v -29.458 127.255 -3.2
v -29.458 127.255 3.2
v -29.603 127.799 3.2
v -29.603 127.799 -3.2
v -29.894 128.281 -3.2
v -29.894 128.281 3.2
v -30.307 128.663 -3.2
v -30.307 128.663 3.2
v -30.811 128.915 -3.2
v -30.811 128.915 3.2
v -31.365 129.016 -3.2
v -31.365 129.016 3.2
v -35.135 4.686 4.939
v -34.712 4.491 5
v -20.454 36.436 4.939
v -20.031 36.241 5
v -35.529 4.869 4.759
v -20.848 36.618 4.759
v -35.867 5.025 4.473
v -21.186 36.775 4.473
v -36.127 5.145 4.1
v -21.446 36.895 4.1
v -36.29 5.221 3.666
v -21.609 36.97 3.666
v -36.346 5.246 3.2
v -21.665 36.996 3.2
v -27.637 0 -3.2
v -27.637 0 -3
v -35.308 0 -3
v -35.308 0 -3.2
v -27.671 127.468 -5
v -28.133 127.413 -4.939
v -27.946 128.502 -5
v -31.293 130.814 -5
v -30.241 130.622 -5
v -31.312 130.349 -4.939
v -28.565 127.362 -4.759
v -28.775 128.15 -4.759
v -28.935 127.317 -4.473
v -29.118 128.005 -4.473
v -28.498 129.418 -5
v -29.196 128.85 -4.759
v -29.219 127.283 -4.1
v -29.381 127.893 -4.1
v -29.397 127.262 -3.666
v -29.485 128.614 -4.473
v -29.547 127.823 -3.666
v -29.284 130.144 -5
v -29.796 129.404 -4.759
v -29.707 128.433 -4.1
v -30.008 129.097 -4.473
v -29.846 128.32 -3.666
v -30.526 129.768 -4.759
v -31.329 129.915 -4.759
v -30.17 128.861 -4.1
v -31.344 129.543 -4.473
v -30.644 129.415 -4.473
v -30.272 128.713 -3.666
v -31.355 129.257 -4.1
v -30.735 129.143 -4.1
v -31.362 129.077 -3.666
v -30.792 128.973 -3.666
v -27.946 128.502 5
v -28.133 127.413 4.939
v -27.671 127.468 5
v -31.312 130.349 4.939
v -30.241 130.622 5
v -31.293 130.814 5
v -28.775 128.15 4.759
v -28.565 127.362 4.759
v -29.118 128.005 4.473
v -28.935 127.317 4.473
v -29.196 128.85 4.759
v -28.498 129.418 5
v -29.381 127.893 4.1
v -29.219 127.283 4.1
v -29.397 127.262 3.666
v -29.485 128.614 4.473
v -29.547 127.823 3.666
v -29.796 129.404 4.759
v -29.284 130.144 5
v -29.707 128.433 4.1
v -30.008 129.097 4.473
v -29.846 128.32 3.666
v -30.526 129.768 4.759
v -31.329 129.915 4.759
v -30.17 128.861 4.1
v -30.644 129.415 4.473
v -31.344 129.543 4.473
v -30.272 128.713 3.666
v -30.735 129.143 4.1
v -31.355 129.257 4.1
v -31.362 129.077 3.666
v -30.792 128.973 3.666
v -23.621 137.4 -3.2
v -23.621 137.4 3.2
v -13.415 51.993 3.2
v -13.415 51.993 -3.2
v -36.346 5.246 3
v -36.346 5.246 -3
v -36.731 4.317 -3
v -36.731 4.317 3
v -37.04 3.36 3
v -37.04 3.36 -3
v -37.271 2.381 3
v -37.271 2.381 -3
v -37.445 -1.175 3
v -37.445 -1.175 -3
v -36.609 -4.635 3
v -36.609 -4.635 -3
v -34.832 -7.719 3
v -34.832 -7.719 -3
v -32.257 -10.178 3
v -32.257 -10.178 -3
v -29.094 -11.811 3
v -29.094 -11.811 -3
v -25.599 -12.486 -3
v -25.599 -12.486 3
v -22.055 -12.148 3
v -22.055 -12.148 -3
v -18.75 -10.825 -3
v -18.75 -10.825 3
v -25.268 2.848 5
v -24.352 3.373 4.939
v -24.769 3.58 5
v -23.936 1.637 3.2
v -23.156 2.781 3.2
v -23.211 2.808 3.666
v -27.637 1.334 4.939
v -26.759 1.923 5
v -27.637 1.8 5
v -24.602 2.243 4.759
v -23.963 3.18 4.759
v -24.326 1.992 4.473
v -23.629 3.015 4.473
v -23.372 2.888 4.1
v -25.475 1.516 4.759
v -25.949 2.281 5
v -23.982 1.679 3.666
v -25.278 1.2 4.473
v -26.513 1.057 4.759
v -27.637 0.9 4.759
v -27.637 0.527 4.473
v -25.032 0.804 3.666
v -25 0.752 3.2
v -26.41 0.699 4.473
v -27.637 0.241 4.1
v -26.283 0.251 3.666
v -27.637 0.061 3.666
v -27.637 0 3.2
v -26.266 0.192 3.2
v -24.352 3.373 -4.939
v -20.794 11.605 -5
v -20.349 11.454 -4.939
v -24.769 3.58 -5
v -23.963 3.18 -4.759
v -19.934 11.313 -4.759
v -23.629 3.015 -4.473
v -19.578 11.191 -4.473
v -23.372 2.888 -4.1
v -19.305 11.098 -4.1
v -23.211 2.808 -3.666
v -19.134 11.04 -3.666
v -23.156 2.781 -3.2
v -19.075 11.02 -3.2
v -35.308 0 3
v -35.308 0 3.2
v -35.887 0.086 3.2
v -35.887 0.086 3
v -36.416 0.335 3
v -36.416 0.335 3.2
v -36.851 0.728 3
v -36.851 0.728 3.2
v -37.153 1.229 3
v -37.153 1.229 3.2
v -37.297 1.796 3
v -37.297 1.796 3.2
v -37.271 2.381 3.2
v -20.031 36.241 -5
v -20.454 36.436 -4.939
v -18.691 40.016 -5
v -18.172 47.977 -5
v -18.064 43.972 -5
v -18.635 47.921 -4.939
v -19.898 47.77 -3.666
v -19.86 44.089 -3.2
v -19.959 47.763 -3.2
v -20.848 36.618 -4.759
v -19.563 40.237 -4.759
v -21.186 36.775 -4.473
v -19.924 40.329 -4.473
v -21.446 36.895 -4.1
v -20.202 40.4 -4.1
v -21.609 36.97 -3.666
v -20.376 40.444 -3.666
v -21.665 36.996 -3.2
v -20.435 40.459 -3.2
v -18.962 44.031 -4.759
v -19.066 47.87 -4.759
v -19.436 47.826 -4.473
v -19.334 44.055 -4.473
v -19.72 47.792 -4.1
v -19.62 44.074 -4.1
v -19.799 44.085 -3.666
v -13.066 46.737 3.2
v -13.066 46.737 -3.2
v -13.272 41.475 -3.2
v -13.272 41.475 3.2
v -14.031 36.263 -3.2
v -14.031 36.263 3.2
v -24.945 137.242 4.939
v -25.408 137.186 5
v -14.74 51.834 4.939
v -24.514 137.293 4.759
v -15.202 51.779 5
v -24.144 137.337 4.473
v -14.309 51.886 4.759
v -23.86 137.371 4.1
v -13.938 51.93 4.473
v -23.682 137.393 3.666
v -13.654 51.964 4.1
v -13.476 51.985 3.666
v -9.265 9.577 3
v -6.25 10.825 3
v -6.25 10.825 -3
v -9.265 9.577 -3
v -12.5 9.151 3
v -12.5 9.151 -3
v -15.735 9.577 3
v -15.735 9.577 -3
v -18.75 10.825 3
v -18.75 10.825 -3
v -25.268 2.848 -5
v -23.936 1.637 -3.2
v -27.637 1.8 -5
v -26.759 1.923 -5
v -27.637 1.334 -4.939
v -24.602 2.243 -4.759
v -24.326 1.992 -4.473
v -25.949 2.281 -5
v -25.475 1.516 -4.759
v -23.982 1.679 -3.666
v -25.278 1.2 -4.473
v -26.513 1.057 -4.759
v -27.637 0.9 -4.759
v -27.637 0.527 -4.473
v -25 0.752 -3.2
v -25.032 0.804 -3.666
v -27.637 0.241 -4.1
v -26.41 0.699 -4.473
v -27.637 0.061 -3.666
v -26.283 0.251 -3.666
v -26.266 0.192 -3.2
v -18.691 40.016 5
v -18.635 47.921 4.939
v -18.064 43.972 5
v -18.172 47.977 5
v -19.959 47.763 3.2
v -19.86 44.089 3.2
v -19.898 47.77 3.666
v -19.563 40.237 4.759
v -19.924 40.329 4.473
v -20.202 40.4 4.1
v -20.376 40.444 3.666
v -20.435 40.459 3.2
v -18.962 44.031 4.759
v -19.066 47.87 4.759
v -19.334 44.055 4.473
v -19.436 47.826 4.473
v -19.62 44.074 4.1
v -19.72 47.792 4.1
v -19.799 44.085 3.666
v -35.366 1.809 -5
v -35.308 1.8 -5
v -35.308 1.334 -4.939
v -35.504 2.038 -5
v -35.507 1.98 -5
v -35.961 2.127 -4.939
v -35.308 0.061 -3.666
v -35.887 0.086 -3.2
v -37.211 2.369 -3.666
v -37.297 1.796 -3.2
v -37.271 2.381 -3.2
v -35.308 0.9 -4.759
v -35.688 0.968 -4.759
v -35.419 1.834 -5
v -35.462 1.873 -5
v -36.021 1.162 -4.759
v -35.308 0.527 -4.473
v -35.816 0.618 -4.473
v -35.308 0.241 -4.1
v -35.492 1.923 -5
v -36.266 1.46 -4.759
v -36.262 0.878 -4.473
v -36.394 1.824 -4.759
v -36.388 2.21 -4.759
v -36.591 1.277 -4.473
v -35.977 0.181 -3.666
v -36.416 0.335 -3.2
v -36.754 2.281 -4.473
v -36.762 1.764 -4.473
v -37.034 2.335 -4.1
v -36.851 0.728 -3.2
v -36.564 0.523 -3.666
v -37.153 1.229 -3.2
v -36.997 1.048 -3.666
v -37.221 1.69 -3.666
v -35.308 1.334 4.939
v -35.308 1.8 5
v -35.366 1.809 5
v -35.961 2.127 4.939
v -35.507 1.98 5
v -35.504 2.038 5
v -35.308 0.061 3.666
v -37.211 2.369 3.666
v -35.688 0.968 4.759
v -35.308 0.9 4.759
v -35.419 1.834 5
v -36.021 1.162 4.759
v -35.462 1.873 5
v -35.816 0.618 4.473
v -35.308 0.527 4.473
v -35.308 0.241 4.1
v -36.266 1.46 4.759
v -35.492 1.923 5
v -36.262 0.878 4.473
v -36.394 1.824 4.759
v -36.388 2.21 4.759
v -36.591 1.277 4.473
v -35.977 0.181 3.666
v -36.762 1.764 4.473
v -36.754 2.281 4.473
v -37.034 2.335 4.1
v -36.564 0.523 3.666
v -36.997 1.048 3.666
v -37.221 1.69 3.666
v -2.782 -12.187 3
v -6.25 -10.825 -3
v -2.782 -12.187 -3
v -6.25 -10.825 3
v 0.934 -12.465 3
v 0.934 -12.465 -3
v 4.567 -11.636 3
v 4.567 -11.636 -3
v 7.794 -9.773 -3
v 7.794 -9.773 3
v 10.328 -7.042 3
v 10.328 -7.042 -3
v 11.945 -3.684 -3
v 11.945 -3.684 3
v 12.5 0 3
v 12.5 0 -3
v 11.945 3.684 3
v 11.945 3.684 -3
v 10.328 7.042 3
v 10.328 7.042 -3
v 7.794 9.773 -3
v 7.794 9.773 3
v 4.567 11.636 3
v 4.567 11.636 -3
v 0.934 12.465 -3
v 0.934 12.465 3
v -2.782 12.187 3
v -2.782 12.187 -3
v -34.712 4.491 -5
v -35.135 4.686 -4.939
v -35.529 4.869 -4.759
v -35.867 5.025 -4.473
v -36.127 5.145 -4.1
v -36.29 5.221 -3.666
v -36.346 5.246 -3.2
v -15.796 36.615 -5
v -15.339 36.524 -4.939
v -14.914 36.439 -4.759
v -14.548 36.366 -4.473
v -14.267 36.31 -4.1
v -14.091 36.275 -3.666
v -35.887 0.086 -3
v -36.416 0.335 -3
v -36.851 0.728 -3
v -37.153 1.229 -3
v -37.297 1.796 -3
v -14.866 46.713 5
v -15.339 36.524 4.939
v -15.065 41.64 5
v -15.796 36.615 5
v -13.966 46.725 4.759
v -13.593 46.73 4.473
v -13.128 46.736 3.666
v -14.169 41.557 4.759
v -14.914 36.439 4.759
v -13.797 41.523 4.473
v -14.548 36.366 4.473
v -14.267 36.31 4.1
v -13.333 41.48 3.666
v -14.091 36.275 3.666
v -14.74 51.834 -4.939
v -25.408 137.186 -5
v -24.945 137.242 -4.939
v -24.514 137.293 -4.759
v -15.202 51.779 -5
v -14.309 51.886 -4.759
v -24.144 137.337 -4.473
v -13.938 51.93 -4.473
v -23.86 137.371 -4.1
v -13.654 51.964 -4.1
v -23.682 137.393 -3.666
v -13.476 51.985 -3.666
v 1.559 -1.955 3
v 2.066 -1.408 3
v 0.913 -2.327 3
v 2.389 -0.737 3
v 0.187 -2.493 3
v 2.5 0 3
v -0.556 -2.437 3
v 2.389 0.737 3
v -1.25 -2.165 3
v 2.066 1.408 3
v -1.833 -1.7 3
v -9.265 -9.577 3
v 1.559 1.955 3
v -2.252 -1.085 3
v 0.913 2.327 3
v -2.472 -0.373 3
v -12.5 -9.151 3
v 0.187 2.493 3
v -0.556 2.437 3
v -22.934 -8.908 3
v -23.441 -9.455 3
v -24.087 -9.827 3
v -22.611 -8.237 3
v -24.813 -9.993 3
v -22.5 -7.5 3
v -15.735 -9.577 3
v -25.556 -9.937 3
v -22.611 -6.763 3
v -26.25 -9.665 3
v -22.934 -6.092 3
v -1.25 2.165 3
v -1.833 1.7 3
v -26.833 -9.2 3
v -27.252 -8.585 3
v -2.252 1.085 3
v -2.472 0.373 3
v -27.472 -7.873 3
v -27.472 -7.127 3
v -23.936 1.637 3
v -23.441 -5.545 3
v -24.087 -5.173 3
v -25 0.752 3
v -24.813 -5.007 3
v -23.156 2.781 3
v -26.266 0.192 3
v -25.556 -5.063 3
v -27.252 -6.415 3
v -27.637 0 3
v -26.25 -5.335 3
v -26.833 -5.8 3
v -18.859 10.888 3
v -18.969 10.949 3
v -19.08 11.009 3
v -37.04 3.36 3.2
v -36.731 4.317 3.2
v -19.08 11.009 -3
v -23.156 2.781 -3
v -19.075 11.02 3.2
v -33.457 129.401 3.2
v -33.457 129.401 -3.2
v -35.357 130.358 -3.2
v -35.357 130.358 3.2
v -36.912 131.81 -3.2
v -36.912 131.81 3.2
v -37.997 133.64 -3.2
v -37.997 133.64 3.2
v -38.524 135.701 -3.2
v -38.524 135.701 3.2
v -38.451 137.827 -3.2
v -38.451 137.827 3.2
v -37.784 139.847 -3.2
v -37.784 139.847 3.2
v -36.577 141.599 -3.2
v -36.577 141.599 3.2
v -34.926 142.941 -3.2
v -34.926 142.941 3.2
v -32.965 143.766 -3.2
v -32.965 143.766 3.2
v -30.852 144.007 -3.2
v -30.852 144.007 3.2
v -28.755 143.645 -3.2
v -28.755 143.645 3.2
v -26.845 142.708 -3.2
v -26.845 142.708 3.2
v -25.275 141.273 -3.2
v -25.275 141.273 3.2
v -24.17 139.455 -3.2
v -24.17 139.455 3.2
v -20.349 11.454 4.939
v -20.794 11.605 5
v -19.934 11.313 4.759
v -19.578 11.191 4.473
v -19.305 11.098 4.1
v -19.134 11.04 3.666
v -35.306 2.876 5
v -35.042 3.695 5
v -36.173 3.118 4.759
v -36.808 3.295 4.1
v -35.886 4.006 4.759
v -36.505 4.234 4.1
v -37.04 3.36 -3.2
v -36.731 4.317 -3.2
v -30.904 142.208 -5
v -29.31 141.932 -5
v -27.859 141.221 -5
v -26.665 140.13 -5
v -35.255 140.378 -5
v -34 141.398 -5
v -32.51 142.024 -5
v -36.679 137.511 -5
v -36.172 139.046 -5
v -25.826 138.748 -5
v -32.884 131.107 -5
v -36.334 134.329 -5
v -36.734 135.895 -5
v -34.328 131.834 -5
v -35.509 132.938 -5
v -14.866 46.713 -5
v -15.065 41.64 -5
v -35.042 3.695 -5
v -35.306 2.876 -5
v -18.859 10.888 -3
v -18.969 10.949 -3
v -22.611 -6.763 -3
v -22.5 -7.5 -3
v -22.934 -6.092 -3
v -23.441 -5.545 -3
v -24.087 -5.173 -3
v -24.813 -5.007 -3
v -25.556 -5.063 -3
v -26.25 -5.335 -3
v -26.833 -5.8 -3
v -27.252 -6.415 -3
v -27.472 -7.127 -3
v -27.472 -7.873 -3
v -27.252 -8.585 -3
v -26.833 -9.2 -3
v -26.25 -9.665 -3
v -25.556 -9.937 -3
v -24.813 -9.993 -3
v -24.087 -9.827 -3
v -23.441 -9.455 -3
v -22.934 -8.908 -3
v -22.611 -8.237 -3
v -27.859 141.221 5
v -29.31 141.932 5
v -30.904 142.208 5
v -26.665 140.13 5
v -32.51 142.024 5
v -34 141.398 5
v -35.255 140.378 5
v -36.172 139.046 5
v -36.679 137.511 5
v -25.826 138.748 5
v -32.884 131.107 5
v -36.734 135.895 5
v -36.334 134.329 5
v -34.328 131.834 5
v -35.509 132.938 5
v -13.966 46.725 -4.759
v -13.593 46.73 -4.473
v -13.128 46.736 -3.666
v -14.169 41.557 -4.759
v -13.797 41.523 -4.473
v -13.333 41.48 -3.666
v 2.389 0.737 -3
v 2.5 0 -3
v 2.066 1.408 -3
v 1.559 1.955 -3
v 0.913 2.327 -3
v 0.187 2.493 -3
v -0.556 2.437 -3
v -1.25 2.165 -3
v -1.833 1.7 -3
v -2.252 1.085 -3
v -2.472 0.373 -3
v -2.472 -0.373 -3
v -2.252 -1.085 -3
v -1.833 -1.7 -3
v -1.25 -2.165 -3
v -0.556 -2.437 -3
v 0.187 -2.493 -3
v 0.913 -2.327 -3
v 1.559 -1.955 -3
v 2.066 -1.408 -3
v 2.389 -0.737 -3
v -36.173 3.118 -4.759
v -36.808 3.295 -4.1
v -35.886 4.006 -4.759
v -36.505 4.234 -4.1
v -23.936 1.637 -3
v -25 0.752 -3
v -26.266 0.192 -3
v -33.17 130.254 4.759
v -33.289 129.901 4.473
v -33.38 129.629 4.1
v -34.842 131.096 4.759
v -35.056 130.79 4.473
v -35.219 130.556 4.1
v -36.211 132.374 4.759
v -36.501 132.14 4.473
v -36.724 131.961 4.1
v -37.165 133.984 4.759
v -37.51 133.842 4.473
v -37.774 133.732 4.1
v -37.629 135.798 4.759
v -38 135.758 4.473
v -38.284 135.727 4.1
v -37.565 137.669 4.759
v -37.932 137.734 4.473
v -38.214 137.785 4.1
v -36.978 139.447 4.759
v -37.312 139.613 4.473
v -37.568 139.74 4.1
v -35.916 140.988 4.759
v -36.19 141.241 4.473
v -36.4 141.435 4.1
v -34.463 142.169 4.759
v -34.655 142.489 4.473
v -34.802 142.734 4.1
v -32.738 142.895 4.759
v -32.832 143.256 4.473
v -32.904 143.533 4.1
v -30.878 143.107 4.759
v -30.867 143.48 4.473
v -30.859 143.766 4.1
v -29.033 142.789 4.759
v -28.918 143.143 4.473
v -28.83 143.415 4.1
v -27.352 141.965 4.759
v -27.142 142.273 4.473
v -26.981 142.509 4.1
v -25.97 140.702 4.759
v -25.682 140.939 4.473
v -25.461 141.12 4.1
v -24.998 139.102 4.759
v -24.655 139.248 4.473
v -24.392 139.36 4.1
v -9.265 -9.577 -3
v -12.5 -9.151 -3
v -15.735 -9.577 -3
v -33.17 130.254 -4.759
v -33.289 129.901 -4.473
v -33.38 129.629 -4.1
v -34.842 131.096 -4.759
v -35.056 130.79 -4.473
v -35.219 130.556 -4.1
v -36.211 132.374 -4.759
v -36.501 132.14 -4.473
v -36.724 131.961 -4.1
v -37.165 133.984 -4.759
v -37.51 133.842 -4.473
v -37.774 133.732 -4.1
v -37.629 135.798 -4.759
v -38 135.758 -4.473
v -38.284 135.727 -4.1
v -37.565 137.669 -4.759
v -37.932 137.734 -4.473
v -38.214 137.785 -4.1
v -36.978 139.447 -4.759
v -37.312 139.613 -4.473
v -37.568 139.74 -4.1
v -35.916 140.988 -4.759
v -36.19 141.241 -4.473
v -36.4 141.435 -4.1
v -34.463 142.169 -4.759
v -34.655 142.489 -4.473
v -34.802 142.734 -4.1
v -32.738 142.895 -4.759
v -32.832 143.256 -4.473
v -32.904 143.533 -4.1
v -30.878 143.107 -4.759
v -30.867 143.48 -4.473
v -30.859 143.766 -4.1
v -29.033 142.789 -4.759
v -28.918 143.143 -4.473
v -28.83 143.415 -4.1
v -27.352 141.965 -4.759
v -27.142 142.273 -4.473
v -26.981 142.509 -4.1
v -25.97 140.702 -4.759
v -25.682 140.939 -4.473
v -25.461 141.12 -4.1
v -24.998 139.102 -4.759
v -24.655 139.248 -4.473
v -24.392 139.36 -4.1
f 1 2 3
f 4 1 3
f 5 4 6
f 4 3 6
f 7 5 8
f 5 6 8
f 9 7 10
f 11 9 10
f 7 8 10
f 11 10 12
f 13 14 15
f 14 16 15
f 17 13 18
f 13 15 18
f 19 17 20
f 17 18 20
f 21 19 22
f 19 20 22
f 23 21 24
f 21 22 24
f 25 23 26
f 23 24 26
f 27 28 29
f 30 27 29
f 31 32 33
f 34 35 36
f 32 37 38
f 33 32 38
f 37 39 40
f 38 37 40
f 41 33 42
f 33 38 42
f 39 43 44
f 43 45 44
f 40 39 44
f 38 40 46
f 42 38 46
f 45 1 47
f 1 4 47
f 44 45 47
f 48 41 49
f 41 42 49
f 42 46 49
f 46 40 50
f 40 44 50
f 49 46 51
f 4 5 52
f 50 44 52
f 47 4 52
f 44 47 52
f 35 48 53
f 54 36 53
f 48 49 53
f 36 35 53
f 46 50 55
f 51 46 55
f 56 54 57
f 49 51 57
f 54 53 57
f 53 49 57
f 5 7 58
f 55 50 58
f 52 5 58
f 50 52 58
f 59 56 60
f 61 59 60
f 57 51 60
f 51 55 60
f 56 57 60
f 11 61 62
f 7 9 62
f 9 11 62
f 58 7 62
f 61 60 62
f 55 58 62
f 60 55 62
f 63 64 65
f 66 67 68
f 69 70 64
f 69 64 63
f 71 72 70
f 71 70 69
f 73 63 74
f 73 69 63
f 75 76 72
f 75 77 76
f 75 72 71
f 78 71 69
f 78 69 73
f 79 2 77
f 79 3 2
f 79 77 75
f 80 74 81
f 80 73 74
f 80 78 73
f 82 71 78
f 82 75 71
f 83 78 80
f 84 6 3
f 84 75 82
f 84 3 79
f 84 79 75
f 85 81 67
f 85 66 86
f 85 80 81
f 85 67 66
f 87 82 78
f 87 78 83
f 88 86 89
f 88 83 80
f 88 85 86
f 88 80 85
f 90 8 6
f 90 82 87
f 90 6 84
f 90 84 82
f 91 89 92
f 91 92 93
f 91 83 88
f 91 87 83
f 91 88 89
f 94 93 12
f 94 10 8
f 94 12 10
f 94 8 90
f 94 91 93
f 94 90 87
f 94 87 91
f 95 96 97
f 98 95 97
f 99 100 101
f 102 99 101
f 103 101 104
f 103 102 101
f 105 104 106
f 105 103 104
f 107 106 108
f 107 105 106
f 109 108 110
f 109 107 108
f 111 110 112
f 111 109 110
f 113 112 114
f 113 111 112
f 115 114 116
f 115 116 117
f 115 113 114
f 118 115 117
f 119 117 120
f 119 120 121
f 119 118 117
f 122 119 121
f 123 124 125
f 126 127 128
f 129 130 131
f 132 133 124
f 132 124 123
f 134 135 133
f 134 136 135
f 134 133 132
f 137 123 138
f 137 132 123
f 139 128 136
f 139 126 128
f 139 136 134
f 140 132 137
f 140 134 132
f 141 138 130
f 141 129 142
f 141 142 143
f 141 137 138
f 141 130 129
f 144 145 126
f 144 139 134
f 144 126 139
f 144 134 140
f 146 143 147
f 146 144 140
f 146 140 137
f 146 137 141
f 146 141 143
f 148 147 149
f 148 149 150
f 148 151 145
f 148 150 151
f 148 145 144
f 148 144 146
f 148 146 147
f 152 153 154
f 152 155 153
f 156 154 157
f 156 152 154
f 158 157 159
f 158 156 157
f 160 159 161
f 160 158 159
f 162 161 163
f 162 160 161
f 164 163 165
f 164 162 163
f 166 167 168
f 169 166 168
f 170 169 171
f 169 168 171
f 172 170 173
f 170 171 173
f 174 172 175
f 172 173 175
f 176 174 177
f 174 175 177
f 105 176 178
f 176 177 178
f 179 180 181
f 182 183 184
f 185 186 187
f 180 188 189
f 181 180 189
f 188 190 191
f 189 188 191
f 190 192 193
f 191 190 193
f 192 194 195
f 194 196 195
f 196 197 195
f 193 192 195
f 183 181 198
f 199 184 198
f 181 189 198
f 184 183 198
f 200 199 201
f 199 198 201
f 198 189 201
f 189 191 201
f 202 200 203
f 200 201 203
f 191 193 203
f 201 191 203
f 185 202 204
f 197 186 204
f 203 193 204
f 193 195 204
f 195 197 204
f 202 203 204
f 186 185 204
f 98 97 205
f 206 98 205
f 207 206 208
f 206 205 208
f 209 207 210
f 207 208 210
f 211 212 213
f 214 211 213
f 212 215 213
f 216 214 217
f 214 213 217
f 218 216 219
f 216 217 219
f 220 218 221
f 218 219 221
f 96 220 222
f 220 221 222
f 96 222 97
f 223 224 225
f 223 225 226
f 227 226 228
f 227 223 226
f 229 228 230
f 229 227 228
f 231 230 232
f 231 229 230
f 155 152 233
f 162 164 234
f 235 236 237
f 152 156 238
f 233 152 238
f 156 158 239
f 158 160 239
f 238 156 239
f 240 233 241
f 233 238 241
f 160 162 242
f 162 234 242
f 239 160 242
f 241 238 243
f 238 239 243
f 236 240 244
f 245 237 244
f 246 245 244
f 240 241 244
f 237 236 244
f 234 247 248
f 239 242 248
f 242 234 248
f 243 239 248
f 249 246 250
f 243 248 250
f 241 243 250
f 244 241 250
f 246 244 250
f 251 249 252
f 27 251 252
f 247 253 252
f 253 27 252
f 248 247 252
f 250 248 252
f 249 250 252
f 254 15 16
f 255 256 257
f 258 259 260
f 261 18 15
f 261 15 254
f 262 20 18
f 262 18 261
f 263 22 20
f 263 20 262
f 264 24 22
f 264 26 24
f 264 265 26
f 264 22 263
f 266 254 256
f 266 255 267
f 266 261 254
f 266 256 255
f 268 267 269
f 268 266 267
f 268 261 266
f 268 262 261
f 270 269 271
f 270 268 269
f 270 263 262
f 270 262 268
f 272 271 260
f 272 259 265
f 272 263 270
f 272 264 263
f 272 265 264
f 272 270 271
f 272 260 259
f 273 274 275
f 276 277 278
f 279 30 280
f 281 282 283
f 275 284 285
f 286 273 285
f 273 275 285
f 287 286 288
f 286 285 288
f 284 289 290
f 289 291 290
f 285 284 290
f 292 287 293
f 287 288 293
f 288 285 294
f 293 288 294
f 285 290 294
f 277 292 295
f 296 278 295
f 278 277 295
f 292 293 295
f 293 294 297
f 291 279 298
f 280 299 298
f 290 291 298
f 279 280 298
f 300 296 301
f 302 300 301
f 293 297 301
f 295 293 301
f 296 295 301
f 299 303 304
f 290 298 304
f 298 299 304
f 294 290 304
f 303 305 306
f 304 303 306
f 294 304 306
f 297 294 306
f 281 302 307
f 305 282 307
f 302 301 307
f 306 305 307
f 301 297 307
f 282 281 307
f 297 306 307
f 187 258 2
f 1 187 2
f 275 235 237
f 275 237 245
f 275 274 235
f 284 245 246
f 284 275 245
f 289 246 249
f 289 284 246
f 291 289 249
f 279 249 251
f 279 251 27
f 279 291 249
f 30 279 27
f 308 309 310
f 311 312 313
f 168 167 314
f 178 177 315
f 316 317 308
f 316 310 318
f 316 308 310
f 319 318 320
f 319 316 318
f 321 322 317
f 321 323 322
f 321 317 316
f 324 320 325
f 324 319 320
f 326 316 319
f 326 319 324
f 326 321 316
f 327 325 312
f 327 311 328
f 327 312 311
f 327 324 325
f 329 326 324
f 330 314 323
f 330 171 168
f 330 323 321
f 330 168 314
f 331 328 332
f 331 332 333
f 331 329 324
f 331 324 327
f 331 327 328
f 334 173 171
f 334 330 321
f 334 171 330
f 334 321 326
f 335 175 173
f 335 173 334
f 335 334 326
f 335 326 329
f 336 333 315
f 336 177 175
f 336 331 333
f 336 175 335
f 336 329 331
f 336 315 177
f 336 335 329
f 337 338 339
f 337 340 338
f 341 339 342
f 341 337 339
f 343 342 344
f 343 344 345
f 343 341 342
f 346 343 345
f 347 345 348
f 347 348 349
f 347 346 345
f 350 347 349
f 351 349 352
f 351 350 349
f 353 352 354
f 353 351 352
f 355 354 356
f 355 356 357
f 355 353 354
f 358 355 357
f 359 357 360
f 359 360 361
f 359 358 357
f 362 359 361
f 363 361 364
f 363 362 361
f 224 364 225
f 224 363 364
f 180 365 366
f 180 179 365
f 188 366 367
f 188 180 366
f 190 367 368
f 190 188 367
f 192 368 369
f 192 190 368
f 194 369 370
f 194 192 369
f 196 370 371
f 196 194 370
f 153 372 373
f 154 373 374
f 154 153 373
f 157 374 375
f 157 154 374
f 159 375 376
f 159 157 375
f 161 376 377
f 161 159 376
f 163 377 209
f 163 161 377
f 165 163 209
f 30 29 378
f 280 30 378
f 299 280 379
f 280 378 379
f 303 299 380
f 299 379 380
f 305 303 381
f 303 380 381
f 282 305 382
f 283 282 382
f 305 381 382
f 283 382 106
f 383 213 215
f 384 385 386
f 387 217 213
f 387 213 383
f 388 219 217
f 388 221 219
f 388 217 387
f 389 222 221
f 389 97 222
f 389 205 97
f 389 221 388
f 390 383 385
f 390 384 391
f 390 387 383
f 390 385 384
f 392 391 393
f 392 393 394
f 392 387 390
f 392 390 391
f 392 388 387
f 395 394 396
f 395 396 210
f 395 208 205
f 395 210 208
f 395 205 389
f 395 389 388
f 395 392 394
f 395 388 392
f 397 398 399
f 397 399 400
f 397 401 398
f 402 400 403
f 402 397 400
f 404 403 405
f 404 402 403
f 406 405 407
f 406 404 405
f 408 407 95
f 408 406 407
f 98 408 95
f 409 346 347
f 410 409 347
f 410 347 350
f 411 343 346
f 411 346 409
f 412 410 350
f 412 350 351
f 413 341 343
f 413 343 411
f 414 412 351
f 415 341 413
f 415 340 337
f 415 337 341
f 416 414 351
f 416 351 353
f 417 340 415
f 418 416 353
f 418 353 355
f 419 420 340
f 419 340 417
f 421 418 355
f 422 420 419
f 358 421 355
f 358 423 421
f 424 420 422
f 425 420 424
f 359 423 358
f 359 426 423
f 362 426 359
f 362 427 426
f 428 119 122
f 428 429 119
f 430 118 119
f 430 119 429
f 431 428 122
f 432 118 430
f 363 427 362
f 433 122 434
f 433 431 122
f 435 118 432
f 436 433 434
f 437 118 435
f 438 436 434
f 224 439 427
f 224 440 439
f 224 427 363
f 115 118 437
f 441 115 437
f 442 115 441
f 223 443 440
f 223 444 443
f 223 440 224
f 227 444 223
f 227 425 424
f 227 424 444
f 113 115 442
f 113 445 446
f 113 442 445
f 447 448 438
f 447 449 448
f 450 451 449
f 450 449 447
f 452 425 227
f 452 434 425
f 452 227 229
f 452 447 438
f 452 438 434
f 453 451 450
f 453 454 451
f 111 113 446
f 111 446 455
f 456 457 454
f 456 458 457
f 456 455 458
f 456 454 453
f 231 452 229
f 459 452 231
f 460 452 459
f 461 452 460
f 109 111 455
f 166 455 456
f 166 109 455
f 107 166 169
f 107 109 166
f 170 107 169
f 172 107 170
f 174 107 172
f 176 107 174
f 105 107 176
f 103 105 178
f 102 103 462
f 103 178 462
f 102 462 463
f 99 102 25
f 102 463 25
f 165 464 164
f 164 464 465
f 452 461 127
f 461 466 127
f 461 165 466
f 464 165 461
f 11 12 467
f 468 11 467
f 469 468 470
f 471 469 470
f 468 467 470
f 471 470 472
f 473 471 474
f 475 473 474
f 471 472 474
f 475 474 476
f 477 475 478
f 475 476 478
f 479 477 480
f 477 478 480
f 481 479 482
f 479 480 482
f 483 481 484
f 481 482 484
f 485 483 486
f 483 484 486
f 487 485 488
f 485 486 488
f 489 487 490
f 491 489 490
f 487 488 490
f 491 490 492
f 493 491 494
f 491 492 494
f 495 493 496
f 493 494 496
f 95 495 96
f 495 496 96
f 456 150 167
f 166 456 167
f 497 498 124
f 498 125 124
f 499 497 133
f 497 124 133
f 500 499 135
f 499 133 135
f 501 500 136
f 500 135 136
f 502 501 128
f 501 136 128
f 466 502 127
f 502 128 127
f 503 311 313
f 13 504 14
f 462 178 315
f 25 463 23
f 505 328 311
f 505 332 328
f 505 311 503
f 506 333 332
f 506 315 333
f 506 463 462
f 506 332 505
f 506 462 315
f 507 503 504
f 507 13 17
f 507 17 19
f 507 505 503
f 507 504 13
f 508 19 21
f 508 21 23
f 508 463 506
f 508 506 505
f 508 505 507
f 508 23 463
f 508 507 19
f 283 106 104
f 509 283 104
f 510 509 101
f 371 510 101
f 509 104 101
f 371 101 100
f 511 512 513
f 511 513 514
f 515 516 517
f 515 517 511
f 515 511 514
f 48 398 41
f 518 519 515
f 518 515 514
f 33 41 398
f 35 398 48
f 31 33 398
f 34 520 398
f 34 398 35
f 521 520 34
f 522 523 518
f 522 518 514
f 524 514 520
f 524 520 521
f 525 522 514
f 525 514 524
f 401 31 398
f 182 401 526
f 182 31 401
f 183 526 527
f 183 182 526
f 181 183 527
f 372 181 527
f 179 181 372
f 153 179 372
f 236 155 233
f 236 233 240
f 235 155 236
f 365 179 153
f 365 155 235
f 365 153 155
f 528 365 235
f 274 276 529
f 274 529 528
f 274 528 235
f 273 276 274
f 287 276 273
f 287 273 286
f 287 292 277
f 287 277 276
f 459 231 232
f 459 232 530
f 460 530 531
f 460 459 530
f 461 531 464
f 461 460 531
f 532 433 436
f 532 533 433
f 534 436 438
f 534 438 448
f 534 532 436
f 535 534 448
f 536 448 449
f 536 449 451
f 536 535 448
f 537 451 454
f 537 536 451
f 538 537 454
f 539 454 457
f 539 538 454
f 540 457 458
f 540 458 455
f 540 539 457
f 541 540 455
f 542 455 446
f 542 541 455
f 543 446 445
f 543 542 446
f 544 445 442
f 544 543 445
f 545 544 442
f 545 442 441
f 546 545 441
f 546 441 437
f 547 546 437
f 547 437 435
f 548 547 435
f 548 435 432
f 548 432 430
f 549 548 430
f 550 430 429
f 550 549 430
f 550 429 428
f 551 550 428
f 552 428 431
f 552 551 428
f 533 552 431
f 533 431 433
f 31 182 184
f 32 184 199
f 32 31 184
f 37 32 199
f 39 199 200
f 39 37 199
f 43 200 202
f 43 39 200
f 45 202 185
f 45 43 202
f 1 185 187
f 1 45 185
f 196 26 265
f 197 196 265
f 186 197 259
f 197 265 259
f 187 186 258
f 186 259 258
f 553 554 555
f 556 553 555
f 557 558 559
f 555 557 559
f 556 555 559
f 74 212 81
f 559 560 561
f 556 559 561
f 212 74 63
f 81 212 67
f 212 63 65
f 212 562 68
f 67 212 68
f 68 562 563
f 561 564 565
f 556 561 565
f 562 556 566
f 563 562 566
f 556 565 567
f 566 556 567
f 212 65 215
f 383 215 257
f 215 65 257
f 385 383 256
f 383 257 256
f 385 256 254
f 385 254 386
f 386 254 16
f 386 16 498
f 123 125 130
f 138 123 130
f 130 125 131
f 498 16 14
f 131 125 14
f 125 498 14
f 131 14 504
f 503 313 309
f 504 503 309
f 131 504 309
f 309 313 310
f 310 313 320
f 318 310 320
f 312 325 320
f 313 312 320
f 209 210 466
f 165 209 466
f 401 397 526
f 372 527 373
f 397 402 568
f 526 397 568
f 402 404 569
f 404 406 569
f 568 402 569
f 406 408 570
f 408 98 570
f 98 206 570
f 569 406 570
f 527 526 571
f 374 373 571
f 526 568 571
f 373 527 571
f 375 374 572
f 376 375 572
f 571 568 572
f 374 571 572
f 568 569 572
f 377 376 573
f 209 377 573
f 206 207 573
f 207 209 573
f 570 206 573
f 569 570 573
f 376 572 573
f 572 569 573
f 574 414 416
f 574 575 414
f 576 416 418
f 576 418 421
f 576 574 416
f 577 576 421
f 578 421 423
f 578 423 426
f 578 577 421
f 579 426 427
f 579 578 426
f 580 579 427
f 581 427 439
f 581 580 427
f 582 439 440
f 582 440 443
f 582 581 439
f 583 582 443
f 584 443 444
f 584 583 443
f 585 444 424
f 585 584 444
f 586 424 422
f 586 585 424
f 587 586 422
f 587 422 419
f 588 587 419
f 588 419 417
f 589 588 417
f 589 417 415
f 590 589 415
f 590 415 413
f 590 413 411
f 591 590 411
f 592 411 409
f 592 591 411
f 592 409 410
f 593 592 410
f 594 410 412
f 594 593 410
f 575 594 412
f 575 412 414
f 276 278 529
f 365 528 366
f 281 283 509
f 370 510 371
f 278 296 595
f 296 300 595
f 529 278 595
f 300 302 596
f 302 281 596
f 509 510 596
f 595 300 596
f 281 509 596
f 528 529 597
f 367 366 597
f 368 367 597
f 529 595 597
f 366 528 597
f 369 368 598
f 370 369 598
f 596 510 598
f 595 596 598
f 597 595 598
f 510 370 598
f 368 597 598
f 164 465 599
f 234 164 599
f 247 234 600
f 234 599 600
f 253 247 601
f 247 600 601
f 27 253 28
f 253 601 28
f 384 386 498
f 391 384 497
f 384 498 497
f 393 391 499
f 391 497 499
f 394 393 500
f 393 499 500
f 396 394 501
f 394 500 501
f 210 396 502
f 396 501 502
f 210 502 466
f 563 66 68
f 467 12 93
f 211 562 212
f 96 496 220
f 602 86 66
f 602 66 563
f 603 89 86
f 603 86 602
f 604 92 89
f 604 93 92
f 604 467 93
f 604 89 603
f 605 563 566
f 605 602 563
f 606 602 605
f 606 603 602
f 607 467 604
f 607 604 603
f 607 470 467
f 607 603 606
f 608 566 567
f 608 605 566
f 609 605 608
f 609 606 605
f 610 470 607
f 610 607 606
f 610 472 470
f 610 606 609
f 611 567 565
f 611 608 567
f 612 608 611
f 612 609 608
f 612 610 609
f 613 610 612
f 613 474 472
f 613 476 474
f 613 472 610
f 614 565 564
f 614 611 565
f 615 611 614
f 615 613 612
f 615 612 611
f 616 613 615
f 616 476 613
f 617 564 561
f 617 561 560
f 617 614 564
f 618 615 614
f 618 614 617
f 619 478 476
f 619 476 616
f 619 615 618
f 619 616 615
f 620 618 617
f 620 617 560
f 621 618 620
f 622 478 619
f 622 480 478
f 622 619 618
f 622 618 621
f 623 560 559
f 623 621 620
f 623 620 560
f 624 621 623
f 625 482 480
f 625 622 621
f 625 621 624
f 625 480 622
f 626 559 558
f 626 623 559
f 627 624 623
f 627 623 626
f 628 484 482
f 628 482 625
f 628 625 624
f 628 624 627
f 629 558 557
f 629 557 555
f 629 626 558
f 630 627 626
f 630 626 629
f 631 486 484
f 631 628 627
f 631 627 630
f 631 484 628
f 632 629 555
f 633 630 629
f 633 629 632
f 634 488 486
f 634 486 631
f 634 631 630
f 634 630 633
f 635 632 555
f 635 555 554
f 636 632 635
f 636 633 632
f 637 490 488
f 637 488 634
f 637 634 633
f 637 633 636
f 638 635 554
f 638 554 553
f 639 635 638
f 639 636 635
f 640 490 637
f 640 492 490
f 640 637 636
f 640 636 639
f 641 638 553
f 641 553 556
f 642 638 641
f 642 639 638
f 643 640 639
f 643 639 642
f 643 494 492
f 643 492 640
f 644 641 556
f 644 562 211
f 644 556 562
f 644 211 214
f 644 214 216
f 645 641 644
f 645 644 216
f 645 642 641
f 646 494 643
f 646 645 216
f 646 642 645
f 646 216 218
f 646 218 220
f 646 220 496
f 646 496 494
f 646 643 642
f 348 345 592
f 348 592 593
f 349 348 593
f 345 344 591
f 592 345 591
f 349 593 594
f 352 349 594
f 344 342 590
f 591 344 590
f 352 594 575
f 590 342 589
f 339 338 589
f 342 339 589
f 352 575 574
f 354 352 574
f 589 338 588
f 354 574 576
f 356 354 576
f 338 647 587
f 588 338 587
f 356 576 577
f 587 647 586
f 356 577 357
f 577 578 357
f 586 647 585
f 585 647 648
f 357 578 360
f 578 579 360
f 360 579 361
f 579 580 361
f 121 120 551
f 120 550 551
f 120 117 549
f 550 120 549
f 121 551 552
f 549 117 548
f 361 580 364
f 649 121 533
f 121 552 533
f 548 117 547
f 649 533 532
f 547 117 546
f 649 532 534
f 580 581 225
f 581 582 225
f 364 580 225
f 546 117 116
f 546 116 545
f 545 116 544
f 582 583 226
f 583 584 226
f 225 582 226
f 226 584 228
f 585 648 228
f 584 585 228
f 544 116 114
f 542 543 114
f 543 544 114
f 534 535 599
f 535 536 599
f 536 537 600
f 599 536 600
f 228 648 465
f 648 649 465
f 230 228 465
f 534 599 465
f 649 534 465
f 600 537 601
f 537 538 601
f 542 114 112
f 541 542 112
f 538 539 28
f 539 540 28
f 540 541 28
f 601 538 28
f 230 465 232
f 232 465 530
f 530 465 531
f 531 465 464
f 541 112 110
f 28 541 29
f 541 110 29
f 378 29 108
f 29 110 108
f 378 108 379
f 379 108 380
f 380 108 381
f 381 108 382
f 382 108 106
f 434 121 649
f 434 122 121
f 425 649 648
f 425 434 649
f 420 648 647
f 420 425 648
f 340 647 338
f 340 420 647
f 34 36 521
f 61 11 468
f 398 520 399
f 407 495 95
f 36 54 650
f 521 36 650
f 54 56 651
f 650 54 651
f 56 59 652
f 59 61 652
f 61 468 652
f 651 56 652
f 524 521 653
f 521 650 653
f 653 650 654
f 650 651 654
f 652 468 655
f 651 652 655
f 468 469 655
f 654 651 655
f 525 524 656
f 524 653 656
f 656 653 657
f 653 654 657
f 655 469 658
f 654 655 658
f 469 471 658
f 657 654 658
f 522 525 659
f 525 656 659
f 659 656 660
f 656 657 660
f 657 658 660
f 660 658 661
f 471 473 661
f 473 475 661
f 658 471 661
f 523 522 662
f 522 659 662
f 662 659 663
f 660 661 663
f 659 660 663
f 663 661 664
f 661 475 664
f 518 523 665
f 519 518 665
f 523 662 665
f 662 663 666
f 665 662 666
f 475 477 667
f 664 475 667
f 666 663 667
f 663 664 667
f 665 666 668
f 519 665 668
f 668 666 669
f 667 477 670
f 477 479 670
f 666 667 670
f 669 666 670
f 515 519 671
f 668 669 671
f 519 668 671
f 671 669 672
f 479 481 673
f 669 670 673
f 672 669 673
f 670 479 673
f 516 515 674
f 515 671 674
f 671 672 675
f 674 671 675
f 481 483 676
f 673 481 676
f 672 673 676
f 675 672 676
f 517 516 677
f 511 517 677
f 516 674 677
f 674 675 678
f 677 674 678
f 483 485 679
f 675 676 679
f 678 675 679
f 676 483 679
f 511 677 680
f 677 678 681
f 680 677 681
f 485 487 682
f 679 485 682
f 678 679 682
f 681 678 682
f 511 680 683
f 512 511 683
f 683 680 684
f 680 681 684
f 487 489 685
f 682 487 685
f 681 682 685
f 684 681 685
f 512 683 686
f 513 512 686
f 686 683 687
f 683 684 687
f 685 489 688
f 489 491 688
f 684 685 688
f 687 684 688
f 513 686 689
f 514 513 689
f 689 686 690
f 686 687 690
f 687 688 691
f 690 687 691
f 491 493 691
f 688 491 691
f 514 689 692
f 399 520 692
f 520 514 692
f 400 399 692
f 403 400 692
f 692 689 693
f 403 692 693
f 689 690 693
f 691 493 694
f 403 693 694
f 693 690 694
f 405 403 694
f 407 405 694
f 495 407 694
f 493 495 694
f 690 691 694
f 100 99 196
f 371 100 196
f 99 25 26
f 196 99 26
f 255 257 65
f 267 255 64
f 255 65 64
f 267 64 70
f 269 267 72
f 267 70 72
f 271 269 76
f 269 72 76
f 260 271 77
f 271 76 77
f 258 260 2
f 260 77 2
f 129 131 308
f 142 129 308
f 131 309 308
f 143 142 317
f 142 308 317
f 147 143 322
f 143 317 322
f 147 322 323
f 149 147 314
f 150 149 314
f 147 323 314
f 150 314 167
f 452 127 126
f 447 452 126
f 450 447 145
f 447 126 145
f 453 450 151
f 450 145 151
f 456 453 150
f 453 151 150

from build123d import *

# Parameters (mm, degrees)
SKETCH1_R           = 2.5
BOSS_EXTRUDE1_DEPTH = 3
BOSS_EXTRUDE2_DEPTH = 5
FILLET1_R           = 1.8


with BuildPart() as part:
    # Sketch1 → Boss-Extrude1 (new, symmetric)
    with BuildSketch(Plane(origin=(0, 0, 0), x_dir=(0, 1, 0), z_dir=(0, 0, 1))):
        with BuildLine():
            ThreePointArc((-10.825318, 6.25), (0, -12.5), (10.825318, 6.25))
            ThreePointArc((10.825318, 6.25), (9.150635, 12.5), (10.825318, 18.75))
            ThreePointArc((10.825318, 18.75), (0, 37.5), (-10.825318, 18.75))
            ThreePointArc((-10.825318, 18.75), (-9.150635, 12.5), (-10.825318, 6.25))
        make_face()
        with Locations(Location((0, 0, 0), (0, 0, 270))):
            Circle(SKETCH1_R, mode=Mode.SUBTRACT)
        with Locations(Location((-7.5, 25, 0), (0, 0, 270))):
            Circle(SKETCH1_R, mode=Mode.SUBTRACT)
    extrude(amount=BOSS_EXTRUDE1_DEPTH, both=True)

    # Sketch2 → Boss-Extrude2 (add, symmetric)
    with BuildSketch(Plane(origin=(0, 0, 0), x_dir=(0, 1, 0), z_dir=(0, 0, 1))):
        with BuildLine():
            ThreePointArc((0, 35.307764), (0.727582, 36.850798), (2.380952, 37.271148))
            ThreePointArc((2.380952, 37.271148), (3.841576, 36.895053), (5.24627, 36.345777))
            Line((5.24627, 36.345777), (36.995968, 21.664764))
            ThreePointArc((36.995968, 21.664764), (42.261052, 20.064281), (47.763018, 19.959286))
            Line((47.763018, 19.959286), (127.25476, 29.458153))
            ThreePointArc((127.25476, 29.458153), (128.486622, 30.086985), (129.015888, 31.364792))
            ThreePointArc((129.015888, 31.364792), (141.598901, 36.577029), (137.399882, 23.620645))
            Line((137.399882, 23.620645), (51.992546, 13.414894))
            ThreePointArc((51.992546, 13.414894), (44.103222, 13.1), (36.262693, 14.030963))
            Line((36.262693, 14.030963), (11.019597, 19.075031))
            Line((11.019597, 19.075031), (2.780641, 23.156138))
            ThreePointArc((2.780641, 23.156138), (0.751659, 25), (0, 27.636589))
            Line((0, 27.636589), (0, 35.307764))
        make_face()
    extrude(amount=BOSS_EXTRUDE2_DEPTH, both=True)

    # Fillet1
    fillet1_edges = [part.edges().sort_by_distance(p)[0] for p in [
        (-36.850798, 0.727582, 5),
        (-21.115584, 6.900119, -5),
        (-31.472177, 0, -5),
        (-25, 0.751659, -5),
        (-16.552997, 23.641145, 5),
        (-13.1, 44.103222, -5),
        (-18.51777, 94.696214, -5),
        (-36.577029, 141.598901, -5),
        (-30.086985, 128.486622, 5),
        (-24.70872, 87.508889, 5),
        (-20.064281, 42.261052, 5),
        (-29.00527, 21.121119, 5),
        (-36.895053, 3.841576, -5),
        (-31.472177, 0, 5),
        (-25, 0.751659, 5),
        (-21.115584, 6.900119, 5),
        (-13.1, 44.103222, 5),
        (-18.51777, 94.696214, 5),
        (-36.577029, 141.598901, 5),
        (-36.895053, 3.841576, 5),
        (-36.850798, 0.727582, -5),
        (-29.00527, 21.121119, -5),
        (-20.064281, 42.261052, -5),
        (-24.70872, 87.508889, -5),
        (-30.086985, 128.486622, -5),
        (-16.552997, 23.641145, -5),
    ]]
    fillet(fillet1_edges, radius=FILLET1_R)


solid = part.part
